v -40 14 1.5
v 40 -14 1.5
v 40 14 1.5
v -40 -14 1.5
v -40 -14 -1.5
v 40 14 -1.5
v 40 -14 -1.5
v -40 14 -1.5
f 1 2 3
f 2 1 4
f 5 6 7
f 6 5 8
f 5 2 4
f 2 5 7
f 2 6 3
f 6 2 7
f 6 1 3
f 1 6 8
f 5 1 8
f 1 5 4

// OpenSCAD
// Starter file for task-007.
// Edit this file in OpenSCAD to complete the requested hard task.
$fn = 64;

leaf_l = 80;
leaf_w = 28;
leaf_t = 3;
cube([leaf_l, leaf_w, leaf_t], center=true);
